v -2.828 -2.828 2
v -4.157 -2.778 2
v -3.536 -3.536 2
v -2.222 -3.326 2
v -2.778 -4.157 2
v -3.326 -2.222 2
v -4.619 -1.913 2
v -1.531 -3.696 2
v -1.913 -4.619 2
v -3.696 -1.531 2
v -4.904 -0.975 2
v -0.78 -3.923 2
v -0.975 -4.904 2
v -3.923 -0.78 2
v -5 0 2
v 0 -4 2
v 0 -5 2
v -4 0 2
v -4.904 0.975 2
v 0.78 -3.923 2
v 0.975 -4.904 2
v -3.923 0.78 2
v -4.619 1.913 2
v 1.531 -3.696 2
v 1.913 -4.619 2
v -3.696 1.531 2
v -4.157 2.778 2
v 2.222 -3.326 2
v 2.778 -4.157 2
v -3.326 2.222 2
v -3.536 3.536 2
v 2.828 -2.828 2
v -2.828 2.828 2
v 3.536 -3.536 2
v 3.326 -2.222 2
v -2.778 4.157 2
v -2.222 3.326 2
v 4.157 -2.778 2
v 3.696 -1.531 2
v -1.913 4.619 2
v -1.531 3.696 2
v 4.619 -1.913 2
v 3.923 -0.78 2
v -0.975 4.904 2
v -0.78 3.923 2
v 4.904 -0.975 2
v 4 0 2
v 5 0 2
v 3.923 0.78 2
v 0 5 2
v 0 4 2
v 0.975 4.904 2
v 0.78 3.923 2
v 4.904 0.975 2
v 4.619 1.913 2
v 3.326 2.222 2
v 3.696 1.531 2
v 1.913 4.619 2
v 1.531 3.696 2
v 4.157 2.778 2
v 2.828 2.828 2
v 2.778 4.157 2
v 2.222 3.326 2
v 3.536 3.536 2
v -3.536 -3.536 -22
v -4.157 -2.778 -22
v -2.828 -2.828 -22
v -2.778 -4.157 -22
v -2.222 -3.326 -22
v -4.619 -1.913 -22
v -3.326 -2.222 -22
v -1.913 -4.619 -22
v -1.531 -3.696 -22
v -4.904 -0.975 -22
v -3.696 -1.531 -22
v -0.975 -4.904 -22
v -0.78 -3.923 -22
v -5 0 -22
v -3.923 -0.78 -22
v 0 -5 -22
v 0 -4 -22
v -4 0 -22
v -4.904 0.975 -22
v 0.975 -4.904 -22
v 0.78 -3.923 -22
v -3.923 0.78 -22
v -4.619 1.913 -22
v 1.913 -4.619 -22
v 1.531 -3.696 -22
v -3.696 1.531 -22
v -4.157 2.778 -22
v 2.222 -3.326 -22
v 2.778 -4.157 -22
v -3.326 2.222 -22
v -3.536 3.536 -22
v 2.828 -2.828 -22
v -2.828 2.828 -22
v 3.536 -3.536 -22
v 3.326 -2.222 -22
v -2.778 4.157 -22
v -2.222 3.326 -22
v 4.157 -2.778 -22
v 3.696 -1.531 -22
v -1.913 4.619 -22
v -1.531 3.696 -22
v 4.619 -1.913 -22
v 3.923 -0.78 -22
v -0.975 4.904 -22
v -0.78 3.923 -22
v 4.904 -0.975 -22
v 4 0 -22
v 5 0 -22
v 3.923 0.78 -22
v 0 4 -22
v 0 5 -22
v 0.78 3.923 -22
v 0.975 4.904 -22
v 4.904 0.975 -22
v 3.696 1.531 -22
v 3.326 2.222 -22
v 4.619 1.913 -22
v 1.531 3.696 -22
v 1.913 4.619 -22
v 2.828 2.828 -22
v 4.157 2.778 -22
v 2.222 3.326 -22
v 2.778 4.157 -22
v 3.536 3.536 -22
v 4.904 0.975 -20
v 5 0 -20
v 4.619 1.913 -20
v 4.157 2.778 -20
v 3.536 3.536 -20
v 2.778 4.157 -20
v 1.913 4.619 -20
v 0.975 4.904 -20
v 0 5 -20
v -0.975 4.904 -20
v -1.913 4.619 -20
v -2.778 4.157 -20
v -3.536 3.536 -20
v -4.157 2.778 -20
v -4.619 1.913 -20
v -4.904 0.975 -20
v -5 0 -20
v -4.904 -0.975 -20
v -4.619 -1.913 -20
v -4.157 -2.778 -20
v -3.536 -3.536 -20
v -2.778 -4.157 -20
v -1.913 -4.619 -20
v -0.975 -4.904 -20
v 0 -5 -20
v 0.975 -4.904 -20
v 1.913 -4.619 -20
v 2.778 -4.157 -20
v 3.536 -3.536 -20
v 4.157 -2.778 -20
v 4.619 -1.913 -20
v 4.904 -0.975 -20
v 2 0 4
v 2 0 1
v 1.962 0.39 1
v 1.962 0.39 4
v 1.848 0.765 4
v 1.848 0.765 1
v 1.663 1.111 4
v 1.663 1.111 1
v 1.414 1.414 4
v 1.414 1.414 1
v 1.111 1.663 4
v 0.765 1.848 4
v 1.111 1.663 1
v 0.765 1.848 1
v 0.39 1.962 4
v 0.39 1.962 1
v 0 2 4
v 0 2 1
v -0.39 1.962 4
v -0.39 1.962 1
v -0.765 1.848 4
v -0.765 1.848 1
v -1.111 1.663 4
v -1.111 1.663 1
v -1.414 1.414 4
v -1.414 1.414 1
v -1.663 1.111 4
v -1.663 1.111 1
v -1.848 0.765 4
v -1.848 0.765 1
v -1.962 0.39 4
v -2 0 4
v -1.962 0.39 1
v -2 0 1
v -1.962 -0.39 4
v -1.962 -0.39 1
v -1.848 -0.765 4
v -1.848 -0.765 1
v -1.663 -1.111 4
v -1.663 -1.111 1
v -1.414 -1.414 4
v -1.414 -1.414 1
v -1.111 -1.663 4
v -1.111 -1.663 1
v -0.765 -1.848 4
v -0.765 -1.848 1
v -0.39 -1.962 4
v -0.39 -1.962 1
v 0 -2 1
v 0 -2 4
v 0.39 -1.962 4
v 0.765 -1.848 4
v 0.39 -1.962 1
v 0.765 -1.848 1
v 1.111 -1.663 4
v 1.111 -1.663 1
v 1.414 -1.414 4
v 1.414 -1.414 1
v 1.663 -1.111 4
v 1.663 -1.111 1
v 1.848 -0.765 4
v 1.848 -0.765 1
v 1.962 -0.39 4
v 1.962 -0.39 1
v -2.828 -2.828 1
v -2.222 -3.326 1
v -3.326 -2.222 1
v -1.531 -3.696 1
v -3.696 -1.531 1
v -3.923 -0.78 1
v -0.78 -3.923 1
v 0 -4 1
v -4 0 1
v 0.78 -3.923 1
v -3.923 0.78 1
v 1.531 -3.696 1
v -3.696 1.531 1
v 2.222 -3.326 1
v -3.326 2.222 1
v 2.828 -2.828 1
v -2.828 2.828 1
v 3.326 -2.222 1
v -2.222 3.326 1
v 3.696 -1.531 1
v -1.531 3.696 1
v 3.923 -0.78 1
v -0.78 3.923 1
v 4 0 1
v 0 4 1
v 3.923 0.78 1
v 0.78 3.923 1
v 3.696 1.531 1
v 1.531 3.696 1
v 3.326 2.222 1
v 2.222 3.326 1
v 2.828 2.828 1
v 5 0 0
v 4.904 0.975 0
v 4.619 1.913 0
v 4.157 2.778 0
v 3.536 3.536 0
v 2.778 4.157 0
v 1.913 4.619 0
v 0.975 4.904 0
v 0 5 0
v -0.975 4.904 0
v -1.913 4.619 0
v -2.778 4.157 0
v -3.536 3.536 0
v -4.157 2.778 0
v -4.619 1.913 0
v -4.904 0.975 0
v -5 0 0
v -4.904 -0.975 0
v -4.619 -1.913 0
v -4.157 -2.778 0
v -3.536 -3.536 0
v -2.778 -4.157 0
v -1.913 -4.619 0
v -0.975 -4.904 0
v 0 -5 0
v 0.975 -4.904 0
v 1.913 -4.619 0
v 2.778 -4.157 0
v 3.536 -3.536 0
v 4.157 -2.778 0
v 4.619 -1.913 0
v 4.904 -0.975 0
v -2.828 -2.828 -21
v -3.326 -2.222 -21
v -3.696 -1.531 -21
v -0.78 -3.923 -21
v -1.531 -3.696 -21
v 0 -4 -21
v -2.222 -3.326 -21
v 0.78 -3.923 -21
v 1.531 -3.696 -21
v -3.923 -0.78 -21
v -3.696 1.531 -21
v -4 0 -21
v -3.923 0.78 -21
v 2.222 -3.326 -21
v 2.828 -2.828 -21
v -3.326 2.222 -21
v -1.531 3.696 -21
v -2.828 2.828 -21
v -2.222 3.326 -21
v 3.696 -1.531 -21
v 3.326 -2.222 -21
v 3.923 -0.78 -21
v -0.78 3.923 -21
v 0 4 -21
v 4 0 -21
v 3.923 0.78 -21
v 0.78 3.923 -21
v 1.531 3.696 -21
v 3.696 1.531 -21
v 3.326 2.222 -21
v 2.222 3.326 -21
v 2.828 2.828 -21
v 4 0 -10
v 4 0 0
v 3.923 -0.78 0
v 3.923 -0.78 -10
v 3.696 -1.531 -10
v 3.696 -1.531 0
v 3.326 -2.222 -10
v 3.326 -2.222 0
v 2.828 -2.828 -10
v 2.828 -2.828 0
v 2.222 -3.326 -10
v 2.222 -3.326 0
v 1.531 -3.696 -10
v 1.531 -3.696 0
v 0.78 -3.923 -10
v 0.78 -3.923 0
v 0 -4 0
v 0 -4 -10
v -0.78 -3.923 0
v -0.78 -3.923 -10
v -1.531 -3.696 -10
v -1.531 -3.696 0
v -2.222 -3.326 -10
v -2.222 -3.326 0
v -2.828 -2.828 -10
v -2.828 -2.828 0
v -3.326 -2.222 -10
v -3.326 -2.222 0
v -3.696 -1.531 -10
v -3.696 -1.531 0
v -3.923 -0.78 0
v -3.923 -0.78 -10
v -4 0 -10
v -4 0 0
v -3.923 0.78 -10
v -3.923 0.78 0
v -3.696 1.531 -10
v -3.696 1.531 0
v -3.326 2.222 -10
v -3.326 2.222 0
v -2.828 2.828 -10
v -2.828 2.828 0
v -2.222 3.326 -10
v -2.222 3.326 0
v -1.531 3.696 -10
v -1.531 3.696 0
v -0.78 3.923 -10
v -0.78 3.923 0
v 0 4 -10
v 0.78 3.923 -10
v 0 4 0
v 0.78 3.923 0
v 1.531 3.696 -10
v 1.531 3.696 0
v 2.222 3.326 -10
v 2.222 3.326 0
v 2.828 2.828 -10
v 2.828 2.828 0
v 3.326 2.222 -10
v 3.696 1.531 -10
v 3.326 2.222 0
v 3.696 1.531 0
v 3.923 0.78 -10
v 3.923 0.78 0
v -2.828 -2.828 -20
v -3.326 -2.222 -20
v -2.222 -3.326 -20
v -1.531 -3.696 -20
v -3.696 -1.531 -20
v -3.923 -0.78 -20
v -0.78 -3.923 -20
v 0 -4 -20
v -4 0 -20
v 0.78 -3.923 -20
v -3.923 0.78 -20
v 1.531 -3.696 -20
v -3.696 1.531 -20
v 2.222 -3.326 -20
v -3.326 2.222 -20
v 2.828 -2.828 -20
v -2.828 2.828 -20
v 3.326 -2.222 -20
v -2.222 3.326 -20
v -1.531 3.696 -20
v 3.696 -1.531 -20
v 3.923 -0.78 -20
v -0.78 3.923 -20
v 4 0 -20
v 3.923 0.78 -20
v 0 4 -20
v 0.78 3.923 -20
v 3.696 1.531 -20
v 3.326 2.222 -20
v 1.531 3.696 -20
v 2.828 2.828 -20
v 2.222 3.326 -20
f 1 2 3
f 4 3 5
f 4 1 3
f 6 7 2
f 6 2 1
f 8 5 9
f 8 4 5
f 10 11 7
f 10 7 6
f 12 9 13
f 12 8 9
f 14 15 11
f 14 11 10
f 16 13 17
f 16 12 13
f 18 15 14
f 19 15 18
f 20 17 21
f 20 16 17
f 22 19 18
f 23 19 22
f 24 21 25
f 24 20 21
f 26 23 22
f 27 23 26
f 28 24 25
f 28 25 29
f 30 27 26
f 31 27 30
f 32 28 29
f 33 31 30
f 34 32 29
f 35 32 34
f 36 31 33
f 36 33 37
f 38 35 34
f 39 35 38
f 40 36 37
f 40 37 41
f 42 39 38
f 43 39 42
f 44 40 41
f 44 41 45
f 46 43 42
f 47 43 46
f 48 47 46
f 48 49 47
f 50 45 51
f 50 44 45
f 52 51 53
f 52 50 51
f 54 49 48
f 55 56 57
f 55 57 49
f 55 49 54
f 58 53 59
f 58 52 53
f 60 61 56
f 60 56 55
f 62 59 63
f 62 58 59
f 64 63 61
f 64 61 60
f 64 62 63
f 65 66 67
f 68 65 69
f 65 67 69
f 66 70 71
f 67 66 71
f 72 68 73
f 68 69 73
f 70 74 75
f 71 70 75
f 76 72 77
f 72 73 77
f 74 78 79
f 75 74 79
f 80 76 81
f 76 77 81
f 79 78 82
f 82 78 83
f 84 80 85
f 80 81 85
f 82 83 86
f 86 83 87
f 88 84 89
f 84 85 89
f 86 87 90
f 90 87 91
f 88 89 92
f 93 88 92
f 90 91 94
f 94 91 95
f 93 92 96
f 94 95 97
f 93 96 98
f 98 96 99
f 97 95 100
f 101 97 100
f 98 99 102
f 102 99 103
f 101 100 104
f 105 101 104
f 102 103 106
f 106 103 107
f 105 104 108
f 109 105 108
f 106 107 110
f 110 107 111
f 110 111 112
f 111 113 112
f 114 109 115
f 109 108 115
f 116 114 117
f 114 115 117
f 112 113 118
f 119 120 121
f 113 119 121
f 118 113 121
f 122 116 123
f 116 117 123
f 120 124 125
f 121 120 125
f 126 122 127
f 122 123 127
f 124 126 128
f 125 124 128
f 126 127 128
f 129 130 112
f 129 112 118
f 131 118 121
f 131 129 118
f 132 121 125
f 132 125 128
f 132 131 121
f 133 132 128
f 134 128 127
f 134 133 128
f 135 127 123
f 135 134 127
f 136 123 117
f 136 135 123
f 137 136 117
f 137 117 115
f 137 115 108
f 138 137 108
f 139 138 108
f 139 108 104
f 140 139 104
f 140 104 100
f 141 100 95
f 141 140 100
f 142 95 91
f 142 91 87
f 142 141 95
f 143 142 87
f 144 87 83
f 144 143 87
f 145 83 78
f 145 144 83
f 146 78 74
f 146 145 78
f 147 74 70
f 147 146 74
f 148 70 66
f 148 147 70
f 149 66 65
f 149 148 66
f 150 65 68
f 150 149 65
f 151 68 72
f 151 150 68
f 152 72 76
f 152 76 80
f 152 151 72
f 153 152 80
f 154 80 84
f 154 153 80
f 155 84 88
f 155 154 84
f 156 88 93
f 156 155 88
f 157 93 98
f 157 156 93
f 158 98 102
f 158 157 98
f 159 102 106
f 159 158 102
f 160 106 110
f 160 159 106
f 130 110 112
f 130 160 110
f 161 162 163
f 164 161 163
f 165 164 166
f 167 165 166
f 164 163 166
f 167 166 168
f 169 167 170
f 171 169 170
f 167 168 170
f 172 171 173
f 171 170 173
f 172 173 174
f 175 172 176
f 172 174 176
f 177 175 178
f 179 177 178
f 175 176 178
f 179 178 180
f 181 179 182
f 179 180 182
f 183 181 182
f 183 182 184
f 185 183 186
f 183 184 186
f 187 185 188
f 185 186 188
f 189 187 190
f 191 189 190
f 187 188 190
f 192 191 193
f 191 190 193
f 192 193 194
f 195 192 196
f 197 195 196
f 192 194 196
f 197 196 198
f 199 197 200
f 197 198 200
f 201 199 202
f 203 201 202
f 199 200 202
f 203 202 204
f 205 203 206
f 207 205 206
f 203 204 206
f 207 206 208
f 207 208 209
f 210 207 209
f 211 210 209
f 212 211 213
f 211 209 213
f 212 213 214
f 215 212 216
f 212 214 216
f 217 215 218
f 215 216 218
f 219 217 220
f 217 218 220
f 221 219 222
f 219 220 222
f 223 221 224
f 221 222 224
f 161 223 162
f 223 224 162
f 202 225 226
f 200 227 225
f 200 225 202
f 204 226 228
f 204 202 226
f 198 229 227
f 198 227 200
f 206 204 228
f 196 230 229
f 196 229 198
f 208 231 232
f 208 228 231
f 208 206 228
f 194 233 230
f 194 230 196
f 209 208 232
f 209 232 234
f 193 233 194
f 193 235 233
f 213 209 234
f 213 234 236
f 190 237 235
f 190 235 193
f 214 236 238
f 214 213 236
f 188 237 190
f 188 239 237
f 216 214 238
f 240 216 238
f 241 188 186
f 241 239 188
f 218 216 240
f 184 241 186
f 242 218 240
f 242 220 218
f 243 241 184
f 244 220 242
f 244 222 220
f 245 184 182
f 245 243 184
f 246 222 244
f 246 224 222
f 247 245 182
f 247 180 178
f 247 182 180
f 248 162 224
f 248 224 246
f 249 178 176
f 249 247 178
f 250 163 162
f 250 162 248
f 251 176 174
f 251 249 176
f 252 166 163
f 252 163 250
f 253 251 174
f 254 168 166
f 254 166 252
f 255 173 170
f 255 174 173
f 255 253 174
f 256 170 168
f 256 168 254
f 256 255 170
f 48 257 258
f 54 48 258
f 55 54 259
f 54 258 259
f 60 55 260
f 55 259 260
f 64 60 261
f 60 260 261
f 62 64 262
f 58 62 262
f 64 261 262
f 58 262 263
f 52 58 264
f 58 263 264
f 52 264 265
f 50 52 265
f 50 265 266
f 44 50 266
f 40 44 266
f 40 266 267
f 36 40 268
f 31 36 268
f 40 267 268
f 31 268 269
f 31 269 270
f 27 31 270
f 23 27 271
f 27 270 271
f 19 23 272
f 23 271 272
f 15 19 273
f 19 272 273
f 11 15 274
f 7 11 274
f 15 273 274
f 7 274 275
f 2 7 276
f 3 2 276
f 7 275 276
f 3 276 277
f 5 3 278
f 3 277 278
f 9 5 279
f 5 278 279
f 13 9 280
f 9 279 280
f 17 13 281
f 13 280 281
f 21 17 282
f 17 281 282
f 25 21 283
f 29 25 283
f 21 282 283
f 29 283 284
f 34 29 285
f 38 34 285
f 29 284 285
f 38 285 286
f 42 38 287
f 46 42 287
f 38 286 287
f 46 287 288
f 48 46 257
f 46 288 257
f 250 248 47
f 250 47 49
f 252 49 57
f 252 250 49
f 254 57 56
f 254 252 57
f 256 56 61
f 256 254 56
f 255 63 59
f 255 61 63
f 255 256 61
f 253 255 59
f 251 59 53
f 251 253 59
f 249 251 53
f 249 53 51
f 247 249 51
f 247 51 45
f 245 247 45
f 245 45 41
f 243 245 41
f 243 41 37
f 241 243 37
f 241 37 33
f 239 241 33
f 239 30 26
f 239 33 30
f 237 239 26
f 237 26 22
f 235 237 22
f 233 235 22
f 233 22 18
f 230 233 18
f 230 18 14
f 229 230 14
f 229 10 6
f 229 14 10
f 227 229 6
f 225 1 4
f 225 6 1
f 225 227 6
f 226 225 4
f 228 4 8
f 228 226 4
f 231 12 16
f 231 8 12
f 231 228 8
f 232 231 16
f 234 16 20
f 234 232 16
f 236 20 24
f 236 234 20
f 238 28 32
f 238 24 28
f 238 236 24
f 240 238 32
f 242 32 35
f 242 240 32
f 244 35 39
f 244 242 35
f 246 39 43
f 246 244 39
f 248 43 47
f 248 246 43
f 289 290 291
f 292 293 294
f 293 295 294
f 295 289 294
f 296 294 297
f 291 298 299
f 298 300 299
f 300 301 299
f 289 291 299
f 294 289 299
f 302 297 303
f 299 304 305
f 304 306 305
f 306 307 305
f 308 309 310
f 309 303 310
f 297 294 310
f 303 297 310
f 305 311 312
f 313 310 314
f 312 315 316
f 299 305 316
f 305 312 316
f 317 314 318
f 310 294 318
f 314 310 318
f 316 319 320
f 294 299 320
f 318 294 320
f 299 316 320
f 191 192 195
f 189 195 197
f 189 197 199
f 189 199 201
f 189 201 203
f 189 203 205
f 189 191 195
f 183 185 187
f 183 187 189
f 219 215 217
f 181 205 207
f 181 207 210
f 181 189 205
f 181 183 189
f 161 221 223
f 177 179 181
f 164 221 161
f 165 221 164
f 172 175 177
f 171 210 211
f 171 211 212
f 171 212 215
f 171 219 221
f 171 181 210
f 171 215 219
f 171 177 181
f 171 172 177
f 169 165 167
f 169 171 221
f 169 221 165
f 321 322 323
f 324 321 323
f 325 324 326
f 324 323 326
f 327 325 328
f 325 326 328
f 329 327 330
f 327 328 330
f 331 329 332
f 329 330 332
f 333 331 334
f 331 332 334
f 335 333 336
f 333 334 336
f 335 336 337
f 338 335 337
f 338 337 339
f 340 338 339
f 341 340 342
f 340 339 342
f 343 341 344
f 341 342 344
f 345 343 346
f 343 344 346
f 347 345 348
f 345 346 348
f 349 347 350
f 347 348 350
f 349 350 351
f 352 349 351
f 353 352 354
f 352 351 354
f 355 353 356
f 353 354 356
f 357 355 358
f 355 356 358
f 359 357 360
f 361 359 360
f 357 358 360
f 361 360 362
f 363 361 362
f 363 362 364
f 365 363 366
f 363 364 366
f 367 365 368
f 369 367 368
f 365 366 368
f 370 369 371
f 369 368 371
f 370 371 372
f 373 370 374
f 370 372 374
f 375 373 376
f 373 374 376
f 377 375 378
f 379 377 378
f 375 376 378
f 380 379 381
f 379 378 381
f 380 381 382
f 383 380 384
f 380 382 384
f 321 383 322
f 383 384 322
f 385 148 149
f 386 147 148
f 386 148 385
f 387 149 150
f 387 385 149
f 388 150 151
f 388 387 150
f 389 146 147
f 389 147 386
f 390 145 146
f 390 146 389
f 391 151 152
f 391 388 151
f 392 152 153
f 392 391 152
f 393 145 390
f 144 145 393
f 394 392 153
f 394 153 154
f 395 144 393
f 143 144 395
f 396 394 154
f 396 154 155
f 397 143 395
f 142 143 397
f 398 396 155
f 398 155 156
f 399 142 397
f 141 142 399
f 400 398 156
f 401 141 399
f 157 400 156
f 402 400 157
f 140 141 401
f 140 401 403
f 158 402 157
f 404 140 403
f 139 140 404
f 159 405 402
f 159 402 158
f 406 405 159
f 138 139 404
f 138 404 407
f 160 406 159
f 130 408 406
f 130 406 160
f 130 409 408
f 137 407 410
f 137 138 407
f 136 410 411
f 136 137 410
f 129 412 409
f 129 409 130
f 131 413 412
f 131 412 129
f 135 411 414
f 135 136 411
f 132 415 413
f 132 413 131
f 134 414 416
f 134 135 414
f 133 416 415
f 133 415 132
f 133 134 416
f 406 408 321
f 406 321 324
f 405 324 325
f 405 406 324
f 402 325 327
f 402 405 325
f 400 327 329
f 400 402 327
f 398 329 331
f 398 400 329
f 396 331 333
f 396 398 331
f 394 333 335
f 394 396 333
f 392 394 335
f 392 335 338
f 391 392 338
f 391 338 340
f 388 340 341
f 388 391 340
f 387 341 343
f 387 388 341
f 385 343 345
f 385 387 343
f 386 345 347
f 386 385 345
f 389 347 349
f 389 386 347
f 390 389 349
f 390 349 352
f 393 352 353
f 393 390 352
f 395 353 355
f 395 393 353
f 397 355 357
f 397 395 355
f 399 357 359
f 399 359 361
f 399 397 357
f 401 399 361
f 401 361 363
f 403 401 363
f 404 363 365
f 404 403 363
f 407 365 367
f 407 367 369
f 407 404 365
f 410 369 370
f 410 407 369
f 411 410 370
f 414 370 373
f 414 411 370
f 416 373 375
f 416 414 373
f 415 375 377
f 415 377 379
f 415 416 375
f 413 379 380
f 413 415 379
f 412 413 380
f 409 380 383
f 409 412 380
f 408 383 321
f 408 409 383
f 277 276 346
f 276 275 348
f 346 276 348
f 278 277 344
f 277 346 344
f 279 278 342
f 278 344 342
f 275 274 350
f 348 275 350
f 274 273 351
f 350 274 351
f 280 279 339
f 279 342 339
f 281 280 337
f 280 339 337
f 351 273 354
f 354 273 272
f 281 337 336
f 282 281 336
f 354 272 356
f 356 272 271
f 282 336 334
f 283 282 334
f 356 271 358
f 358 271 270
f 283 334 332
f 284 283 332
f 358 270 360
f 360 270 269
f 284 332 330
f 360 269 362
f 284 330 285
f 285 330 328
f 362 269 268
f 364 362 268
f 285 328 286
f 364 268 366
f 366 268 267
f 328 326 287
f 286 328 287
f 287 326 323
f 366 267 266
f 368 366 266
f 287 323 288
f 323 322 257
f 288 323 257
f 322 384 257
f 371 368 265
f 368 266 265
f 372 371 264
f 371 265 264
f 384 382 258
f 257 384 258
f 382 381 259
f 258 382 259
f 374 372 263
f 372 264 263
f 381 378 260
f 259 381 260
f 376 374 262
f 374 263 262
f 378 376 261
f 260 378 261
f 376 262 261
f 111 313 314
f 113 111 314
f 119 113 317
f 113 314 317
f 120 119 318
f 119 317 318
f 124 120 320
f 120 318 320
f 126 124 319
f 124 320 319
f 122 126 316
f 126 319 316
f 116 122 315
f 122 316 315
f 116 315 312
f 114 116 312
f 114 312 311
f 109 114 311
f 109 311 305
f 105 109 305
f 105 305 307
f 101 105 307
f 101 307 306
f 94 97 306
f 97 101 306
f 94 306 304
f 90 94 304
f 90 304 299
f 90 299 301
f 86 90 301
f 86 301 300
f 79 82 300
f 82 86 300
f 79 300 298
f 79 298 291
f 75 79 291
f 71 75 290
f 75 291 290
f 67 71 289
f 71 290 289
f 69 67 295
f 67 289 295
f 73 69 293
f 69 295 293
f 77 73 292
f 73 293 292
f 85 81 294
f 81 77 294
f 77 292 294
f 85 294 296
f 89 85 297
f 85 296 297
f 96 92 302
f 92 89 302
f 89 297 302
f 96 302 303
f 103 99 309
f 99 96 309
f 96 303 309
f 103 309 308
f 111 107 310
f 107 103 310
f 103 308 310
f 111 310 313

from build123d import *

# Parameters (mm, degrees)
CROQUIS1_R     = 5
EXTRUIR1_DEPTH = 2
VACIADO1_T     = -1
CROQUIS2_R     = 4
EXTRUIR2_DEPTH = 10
CROQUIS4_R     = 2
EXTRUIR4_DEPTH = 3


with BuildPart() as part:
    # Croquis1 → Extruir1 (new body)
    with BuildSketch(Plane.XY):
        Circle(CROQUIS1_R)
    extrude(amount=EXTRUIR1_DEPTH)

    # Vaciado1
    vaciado1_openings = [part.faces().sort_by_distance(p)[0] for p in [
        (0, 0, 2),
    ]]
    offset(amount=VACIADO1_T, openings=vaciado1_openings, kind=Kind.INTERSECTION)

    # Croquis2 → Extruir2 (add)
    with BuildSketch(Plane(origin=(0, 0, 0), x_dir=(-1, 0, 0), z_dir=(0, 0, -1))):
        with Locations(Location((0, 0, 0), (0, 0, 180))):  # turned: the seam where the file's is
            Circle(CROQUIS2_R)
    extrude(amount=EXTRUIR2_DEPTH)

    # Simetría3: part across plane


with BuildPart() as part_1:
    add(part.part)
    add(part.part.mirror(Plane(origin=(0, 0, -10), x_dir=(1, 0, 0), z_dir=(0, 0, -1))))

    # Croquis4 → Extruir4 (add)
    with BuildSketch(Plane.XY.offset(1)):
        Circle(CROQUIS4_R)
    extrude(amount=EXTRUIR4_DEPTH)


solid = part_1.part
